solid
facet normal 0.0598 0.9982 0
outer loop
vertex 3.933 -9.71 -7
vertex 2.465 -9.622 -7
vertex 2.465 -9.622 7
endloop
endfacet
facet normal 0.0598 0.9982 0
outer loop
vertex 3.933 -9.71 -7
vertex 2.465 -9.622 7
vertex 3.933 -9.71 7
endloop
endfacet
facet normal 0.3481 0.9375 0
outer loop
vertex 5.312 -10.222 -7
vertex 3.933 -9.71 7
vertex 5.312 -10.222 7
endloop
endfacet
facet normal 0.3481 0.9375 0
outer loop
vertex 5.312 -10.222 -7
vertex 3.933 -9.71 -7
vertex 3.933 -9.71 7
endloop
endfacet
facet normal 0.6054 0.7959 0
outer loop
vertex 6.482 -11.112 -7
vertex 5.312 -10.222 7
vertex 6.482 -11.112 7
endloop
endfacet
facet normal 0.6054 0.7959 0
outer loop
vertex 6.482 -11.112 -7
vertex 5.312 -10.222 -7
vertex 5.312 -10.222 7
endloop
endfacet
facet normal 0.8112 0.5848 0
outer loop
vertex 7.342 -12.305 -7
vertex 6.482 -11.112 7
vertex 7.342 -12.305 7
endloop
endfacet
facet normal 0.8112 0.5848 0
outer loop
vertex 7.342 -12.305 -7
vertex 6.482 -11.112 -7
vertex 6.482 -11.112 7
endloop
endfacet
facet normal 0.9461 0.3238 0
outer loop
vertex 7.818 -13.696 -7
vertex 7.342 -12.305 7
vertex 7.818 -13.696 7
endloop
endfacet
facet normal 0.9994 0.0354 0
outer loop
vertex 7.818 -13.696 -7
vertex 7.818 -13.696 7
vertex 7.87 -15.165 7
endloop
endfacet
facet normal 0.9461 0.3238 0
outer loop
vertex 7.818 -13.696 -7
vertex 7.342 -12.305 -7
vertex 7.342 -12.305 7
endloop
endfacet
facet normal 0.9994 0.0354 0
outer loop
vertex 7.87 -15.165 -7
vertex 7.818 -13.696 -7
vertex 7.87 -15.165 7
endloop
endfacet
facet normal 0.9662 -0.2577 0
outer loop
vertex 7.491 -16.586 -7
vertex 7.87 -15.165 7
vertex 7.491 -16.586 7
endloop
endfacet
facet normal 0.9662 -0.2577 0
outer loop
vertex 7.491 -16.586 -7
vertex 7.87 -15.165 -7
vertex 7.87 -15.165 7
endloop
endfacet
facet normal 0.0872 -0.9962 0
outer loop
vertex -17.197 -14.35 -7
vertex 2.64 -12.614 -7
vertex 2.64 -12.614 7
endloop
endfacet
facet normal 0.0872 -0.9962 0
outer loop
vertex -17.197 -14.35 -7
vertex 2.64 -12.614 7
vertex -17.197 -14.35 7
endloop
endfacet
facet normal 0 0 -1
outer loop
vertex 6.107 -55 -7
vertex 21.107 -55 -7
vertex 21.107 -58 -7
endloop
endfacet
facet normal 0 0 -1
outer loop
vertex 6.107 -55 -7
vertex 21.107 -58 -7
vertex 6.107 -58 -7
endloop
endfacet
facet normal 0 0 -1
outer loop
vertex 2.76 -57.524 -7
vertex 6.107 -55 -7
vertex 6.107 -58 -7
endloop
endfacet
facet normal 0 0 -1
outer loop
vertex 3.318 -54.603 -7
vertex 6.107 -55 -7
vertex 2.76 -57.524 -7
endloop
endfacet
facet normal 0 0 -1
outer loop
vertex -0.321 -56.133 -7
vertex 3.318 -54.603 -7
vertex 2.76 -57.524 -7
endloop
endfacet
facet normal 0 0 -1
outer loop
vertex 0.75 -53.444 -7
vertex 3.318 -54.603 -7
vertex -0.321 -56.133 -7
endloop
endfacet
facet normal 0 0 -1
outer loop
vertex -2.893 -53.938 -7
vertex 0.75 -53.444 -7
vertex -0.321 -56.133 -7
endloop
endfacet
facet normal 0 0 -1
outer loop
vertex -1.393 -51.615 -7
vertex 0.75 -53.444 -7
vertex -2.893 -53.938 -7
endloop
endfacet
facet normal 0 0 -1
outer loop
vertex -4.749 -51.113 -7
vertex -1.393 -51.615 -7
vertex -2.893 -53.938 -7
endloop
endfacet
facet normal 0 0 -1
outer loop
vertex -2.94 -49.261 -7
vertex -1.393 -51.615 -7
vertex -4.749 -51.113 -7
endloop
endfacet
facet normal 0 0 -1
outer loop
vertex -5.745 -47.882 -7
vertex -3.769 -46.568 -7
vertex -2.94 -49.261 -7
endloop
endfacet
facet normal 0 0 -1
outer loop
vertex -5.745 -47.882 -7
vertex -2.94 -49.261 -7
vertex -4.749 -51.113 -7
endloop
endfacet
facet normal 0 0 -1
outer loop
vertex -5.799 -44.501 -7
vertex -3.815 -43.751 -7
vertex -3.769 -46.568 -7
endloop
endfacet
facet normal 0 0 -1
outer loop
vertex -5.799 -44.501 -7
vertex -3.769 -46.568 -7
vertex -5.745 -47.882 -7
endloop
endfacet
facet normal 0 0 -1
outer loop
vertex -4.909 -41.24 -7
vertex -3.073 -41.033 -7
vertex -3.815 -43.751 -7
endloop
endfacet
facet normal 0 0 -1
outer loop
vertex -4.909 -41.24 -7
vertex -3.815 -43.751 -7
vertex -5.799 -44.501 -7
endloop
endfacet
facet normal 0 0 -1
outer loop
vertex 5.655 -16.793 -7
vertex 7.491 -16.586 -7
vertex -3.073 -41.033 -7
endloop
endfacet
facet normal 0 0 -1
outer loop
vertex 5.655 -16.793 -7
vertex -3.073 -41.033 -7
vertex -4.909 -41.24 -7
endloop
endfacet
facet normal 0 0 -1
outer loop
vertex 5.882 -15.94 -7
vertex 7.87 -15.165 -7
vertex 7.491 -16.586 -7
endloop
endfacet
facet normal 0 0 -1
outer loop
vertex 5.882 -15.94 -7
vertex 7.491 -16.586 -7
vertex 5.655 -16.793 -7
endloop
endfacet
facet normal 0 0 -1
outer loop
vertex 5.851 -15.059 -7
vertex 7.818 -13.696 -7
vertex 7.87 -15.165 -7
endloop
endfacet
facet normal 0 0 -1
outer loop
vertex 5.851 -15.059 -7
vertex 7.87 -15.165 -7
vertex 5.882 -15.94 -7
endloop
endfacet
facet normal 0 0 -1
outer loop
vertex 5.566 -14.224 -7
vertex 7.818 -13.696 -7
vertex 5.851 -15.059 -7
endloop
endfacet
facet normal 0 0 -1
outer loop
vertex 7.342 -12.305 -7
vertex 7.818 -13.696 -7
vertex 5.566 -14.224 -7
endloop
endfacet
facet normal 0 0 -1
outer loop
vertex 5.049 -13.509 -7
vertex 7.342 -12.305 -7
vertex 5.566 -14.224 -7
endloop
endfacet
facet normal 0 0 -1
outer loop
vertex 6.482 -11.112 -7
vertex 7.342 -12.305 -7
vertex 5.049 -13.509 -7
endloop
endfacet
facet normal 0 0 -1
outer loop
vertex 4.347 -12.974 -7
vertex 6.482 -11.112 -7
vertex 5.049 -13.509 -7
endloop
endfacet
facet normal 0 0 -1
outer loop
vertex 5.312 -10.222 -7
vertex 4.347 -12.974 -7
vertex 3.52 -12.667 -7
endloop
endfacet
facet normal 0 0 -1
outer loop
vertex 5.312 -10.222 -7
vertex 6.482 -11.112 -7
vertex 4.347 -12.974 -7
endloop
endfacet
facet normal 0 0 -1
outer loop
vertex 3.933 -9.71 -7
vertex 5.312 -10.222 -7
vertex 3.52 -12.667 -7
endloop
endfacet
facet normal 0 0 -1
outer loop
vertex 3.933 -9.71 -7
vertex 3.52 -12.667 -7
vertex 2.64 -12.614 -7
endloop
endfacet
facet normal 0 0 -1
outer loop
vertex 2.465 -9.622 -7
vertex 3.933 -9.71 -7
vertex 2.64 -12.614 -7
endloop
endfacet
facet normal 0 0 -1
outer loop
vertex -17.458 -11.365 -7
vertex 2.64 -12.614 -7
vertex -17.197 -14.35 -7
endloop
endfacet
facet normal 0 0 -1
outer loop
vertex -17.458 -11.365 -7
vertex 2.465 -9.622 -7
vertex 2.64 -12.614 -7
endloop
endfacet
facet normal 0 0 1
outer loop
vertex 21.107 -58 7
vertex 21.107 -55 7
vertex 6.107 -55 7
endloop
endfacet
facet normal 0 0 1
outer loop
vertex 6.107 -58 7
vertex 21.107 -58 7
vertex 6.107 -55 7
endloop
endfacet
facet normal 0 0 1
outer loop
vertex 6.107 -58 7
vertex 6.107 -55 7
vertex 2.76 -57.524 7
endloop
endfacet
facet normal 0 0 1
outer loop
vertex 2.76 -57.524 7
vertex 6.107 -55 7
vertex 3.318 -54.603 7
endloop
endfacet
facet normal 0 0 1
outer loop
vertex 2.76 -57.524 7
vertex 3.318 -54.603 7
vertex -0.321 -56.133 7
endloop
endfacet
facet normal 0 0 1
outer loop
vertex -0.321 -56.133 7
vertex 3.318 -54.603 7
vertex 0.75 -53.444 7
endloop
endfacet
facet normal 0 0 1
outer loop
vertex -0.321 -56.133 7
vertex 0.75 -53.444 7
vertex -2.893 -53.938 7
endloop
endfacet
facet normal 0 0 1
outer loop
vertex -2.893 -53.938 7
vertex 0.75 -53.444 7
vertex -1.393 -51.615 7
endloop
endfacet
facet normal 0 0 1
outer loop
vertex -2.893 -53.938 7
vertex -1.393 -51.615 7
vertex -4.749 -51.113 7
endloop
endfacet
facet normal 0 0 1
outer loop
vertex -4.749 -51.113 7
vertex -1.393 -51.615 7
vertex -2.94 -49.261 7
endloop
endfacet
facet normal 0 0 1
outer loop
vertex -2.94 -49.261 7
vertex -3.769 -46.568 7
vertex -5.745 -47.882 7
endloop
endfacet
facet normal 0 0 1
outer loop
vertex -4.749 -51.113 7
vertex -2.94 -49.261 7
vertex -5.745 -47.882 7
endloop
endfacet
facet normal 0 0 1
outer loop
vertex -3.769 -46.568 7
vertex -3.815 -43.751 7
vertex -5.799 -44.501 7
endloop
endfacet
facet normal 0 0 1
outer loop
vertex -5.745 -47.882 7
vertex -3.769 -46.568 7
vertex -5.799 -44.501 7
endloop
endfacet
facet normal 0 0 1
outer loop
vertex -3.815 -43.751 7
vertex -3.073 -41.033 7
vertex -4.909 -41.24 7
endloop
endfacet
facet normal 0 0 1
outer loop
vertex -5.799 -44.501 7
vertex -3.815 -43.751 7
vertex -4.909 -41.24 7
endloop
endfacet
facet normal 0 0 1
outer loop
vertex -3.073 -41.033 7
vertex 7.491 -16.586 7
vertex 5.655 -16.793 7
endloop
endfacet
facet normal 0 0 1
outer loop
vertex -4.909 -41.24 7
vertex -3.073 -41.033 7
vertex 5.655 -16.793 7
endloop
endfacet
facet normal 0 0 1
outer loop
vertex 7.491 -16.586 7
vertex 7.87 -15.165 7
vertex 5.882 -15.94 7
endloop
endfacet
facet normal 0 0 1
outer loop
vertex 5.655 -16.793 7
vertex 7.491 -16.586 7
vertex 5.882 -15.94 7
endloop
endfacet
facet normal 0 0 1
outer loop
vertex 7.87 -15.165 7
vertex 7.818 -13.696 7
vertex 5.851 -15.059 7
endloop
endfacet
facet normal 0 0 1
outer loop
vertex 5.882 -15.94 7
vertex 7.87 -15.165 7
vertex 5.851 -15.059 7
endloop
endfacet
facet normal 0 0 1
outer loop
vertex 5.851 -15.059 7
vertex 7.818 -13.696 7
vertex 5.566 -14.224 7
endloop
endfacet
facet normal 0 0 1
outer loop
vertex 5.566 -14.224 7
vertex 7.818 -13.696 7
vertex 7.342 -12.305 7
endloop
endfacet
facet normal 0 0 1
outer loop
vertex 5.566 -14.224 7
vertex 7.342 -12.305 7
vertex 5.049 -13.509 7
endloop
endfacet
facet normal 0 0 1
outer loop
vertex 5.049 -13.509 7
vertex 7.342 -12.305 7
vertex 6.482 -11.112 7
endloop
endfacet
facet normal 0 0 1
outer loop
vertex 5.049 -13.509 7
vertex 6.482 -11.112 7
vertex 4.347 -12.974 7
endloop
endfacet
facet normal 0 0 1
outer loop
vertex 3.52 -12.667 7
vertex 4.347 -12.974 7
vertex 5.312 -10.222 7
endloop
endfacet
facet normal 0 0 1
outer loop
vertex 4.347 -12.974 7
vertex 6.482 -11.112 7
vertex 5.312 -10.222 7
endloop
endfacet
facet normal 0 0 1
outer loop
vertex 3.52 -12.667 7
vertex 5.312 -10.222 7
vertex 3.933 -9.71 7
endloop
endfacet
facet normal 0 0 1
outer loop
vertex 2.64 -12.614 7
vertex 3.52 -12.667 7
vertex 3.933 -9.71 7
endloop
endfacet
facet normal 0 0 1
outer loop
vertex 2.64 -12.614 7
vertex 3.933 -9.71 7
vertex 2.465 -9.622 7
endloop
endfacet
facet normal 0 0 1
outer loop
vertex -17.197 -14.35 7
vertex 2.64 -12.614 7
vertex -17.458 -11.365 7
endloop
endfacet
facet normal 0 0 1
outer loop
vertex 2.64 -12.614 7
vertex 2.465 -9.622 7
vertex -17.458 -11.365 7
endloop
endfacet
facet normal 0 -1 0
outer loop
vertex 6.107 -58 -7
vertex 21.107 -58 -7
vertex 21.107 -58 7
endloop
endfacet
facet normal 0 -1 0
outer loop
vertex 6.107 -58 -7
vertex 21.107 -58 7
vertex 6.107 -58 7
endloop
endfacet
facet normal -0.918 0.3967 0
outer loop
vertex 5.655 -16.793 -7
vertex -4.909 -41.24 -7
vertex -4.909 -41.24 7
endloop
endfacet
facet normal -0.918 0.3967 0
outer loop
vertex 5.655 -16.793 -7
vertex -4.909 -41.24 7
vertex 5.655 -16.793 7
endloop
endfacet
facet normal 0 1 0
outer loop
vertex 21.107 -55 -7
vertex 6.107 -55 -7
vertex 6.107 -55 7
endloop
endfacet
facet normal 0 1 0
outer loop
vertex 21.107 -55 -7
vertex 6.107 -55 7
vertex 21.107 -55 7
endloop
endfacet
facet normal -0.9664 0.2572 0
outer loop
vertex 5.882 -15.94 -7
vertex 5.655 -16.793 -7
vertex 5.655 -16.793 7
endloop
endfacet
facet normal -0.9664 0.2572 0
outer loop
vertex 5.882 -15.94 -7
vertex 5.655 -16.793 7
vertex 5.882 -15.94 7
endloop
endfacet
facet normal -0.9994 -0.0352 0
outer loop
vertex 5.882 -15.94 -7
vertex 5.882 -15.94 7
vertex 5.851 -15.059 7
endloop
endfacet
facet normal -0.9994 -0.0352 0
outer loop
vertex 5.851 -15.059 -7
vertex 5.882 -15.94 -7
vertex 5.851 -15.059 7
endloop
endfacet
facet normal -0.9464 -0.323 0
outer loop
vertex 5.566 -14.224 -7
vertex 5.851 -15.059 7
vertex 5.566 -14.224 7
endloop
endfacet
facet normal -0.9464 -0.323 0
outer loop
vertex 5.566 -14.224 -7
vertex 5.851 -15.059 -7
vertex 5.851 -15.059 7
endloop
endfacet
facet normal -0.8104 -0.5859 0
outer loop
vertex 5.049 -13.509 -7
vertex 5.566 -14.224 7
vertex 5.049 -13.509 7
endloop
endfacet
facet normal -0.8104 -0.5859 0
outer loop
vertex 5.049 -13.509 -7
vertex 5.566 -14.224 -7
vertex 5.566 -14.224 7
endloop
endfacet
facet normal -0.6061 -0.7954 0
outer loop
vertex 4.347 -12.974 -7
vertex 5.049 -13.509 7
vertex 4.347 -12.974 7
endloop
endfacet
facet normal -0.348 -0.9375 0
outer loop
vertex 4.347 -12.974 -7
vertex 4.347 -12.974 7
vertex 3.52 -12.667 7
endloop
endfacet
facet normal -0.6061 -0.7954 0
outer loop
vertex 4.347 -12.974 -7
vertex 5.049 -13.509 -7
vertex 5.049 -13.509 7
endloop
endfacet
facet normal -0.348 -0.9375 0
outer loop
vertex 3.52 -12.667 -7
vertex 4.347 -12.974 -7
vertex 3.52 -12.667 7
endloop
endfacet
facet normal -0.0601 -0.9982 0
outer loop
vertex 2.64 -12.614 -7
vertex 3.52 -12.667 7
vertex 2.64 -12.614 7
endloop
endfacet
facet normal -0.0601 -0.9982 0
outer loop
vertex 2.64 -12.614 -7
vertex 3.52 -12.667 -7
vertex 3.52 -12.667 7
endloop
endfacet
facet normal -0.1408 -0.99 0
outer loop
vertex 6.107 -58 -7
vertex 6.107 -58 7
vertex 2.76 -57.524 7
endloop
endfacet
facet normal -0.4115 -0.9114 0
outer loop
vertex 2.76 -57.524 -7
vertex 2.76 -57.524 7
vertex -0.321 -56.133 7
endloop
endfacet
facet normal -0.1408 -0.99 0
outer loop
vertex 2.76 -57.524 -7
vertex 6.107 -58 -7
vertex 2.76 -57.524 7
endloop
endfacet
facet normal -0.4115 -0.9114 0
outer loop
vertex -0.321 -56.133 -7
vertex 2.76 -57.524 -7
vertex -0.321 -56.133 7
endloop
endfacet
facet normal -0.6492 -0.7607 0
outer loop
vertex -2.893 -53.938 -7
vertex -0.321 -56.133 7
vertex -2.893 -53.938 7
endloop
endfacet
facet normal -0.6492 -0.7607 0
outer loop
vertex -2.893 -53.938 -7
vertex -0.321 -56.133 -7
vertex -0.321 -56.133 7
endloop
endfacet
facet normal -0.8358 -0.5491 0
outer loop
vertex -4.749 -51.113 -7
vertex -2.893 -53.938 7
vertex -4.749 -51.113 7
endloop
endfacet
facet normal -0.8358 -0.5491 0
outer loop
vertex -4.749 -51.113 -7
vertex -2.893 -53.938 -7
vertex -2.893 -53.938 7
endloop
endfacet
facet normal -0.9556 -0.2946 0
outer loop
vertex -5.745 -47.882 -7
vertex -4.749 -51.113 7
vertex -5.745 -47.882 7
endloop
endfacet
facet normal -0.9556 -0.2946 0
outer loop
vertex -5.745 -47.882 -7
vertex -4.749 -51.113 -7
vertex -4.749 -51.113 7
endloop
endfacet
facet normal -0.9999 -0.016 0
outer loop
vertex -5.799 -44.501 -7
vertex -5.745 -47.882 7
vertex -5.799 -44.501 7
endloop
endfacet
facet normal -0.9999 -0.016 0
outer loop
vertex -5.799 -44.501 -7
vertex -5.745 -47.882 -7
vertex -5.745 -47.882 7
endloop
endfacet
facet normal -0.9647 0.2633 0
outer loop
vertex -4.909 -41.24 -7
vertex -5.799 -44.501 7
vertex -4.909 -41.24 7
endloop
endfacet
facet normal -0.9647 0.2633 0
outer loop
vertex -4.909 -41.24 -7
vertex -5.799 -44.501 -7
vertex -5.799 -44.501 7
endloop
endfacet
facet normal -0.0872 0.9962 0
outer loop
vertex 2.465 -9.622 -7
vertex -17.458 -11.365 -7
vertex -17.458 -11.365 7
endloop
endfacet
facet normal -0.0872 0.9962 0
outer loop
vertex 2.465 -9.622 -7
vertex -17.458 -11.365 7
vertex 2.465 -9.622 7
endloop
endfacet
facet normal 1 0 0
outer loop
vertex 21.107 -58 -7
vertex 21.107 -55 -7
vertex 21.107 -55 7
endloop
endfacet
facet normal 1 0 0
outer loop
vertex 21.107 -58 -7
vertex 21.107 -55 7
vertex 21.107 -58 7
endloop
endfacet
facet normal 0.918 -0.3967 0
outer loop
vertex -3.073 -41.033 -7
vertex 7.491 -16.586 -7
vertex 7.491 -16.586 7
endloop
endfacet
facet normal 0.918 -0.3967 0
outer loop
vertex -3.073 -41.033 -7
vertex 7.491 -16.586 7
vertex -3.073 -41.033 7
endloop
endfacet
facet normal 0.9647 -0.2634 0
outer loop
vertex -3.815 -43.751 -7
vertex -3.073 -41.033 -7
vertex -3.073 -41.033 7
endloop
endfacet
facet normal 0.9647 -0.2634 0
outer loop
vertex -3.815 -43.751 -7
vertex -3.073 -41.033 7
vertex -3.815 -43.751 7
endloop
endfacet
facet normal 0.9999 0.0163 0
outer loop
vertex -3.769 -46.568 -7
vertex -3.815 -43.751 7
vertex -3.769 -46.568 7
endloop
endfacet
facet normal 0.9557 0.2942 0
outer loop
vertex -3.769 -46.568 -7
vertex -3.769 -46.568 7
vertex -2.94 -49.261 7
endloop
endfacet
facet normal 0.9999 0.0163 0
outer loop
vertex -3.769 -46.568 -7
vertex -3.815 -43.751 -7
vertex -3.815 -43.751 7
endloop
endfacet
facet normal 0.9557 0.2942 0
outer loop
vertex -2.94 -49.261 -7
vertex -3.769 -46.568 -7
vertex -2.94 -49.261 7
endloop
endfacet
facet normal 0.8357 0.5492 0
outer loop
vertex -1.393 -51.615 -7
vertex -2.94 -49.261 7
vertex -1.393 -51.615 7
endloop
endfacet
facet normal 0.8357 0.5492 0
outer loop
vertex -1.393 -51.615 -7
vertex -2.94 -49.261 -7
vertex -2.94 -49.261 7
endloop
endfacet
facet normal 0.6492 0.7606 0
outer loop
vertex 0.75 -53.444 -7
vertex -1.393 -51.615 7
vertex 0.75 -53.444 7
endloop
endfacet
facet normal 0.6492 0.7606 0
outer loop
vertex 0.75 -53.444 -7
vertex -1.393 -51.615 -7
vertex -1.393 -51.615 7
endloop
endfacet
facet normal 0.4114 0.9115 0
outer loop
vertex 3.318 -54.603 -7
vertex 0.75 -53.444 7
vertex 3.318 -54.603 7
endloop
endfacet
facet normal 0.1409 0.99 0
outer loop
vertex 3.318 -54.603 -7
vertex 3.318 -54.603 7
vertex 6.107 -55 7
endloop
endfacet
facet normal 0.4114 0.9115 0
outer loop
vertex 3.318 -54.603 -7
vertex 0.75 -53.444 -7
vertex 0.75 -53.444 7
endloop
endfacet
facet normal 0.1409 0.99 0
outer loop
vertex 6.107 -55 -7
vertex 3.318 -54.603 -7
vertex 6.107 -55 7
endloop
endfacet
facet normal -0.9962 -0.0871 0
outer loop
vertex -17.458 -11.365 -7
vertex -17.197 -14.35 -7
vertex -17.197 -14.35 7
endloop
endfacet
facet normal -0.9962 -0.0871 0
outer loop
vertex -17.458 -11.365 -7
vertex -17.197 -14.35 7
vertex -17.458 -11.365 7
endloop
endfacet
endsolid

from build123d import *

# Parameters (mm, degrees)
BOSS_EXTRUDE1_DEPTH      = 7
BOSS_EXTRUDE1_DEPTH_BACK = 7


with BuildPart() as part:
    # Sketch1 → Boss-Extrude1 (new, two sides: drawn at the far end of the back side and taken through both)
    with BuildSketch(Plane.XY.offset(-BOSS_EXTRUDE1_DEPTH_BACK)):
        with BuildLine():
            Line((-17.458418155, -11.36484808), (2.465475807, -9.621733225))
            ThreePointArc((2.465475807, -9.621733225), (6.955793602, -11.676837129), (7.491085956, -16.585998774))
            Line((7.491085956, -16.585998774), (-3.072780906, -41.033415882))
            ThreePointArc((-3.072780906, -41.033415882), (-2.24972743, -50.492456592), (6.106881965, -55))
            Line((6.106881965, -55), (21.106881965, -55))
            Line((21.106881965, -55), (21.106881965, -58))
            Line((21.106881965, -58), (6.106881965, -58))
            ThreePointArc((6.106881965, -58), (-3.921049309, -52.59094791), (-4.908713481, -41.240099059))
            Line((-4.908713481, -41.240099059), (5.655153382, -16.79268195))
            ThreePointArc((5.655153382, -16.79268195), (5.333977969, -13.847184963), (2.639787292, -12.614122621))
            Line((2.639787292, -12.614122621), (-17.197282581, -14.349641352))
            Line((-17.197282581, -14.349641352), (-17.458418155, -11.36484808))
        make_face()
    extrude(amount=BOSS_EXTRUDE1_DEPTH + BOSS_EXTRUDE1_DEPTH_BACK)


solid = part.part
